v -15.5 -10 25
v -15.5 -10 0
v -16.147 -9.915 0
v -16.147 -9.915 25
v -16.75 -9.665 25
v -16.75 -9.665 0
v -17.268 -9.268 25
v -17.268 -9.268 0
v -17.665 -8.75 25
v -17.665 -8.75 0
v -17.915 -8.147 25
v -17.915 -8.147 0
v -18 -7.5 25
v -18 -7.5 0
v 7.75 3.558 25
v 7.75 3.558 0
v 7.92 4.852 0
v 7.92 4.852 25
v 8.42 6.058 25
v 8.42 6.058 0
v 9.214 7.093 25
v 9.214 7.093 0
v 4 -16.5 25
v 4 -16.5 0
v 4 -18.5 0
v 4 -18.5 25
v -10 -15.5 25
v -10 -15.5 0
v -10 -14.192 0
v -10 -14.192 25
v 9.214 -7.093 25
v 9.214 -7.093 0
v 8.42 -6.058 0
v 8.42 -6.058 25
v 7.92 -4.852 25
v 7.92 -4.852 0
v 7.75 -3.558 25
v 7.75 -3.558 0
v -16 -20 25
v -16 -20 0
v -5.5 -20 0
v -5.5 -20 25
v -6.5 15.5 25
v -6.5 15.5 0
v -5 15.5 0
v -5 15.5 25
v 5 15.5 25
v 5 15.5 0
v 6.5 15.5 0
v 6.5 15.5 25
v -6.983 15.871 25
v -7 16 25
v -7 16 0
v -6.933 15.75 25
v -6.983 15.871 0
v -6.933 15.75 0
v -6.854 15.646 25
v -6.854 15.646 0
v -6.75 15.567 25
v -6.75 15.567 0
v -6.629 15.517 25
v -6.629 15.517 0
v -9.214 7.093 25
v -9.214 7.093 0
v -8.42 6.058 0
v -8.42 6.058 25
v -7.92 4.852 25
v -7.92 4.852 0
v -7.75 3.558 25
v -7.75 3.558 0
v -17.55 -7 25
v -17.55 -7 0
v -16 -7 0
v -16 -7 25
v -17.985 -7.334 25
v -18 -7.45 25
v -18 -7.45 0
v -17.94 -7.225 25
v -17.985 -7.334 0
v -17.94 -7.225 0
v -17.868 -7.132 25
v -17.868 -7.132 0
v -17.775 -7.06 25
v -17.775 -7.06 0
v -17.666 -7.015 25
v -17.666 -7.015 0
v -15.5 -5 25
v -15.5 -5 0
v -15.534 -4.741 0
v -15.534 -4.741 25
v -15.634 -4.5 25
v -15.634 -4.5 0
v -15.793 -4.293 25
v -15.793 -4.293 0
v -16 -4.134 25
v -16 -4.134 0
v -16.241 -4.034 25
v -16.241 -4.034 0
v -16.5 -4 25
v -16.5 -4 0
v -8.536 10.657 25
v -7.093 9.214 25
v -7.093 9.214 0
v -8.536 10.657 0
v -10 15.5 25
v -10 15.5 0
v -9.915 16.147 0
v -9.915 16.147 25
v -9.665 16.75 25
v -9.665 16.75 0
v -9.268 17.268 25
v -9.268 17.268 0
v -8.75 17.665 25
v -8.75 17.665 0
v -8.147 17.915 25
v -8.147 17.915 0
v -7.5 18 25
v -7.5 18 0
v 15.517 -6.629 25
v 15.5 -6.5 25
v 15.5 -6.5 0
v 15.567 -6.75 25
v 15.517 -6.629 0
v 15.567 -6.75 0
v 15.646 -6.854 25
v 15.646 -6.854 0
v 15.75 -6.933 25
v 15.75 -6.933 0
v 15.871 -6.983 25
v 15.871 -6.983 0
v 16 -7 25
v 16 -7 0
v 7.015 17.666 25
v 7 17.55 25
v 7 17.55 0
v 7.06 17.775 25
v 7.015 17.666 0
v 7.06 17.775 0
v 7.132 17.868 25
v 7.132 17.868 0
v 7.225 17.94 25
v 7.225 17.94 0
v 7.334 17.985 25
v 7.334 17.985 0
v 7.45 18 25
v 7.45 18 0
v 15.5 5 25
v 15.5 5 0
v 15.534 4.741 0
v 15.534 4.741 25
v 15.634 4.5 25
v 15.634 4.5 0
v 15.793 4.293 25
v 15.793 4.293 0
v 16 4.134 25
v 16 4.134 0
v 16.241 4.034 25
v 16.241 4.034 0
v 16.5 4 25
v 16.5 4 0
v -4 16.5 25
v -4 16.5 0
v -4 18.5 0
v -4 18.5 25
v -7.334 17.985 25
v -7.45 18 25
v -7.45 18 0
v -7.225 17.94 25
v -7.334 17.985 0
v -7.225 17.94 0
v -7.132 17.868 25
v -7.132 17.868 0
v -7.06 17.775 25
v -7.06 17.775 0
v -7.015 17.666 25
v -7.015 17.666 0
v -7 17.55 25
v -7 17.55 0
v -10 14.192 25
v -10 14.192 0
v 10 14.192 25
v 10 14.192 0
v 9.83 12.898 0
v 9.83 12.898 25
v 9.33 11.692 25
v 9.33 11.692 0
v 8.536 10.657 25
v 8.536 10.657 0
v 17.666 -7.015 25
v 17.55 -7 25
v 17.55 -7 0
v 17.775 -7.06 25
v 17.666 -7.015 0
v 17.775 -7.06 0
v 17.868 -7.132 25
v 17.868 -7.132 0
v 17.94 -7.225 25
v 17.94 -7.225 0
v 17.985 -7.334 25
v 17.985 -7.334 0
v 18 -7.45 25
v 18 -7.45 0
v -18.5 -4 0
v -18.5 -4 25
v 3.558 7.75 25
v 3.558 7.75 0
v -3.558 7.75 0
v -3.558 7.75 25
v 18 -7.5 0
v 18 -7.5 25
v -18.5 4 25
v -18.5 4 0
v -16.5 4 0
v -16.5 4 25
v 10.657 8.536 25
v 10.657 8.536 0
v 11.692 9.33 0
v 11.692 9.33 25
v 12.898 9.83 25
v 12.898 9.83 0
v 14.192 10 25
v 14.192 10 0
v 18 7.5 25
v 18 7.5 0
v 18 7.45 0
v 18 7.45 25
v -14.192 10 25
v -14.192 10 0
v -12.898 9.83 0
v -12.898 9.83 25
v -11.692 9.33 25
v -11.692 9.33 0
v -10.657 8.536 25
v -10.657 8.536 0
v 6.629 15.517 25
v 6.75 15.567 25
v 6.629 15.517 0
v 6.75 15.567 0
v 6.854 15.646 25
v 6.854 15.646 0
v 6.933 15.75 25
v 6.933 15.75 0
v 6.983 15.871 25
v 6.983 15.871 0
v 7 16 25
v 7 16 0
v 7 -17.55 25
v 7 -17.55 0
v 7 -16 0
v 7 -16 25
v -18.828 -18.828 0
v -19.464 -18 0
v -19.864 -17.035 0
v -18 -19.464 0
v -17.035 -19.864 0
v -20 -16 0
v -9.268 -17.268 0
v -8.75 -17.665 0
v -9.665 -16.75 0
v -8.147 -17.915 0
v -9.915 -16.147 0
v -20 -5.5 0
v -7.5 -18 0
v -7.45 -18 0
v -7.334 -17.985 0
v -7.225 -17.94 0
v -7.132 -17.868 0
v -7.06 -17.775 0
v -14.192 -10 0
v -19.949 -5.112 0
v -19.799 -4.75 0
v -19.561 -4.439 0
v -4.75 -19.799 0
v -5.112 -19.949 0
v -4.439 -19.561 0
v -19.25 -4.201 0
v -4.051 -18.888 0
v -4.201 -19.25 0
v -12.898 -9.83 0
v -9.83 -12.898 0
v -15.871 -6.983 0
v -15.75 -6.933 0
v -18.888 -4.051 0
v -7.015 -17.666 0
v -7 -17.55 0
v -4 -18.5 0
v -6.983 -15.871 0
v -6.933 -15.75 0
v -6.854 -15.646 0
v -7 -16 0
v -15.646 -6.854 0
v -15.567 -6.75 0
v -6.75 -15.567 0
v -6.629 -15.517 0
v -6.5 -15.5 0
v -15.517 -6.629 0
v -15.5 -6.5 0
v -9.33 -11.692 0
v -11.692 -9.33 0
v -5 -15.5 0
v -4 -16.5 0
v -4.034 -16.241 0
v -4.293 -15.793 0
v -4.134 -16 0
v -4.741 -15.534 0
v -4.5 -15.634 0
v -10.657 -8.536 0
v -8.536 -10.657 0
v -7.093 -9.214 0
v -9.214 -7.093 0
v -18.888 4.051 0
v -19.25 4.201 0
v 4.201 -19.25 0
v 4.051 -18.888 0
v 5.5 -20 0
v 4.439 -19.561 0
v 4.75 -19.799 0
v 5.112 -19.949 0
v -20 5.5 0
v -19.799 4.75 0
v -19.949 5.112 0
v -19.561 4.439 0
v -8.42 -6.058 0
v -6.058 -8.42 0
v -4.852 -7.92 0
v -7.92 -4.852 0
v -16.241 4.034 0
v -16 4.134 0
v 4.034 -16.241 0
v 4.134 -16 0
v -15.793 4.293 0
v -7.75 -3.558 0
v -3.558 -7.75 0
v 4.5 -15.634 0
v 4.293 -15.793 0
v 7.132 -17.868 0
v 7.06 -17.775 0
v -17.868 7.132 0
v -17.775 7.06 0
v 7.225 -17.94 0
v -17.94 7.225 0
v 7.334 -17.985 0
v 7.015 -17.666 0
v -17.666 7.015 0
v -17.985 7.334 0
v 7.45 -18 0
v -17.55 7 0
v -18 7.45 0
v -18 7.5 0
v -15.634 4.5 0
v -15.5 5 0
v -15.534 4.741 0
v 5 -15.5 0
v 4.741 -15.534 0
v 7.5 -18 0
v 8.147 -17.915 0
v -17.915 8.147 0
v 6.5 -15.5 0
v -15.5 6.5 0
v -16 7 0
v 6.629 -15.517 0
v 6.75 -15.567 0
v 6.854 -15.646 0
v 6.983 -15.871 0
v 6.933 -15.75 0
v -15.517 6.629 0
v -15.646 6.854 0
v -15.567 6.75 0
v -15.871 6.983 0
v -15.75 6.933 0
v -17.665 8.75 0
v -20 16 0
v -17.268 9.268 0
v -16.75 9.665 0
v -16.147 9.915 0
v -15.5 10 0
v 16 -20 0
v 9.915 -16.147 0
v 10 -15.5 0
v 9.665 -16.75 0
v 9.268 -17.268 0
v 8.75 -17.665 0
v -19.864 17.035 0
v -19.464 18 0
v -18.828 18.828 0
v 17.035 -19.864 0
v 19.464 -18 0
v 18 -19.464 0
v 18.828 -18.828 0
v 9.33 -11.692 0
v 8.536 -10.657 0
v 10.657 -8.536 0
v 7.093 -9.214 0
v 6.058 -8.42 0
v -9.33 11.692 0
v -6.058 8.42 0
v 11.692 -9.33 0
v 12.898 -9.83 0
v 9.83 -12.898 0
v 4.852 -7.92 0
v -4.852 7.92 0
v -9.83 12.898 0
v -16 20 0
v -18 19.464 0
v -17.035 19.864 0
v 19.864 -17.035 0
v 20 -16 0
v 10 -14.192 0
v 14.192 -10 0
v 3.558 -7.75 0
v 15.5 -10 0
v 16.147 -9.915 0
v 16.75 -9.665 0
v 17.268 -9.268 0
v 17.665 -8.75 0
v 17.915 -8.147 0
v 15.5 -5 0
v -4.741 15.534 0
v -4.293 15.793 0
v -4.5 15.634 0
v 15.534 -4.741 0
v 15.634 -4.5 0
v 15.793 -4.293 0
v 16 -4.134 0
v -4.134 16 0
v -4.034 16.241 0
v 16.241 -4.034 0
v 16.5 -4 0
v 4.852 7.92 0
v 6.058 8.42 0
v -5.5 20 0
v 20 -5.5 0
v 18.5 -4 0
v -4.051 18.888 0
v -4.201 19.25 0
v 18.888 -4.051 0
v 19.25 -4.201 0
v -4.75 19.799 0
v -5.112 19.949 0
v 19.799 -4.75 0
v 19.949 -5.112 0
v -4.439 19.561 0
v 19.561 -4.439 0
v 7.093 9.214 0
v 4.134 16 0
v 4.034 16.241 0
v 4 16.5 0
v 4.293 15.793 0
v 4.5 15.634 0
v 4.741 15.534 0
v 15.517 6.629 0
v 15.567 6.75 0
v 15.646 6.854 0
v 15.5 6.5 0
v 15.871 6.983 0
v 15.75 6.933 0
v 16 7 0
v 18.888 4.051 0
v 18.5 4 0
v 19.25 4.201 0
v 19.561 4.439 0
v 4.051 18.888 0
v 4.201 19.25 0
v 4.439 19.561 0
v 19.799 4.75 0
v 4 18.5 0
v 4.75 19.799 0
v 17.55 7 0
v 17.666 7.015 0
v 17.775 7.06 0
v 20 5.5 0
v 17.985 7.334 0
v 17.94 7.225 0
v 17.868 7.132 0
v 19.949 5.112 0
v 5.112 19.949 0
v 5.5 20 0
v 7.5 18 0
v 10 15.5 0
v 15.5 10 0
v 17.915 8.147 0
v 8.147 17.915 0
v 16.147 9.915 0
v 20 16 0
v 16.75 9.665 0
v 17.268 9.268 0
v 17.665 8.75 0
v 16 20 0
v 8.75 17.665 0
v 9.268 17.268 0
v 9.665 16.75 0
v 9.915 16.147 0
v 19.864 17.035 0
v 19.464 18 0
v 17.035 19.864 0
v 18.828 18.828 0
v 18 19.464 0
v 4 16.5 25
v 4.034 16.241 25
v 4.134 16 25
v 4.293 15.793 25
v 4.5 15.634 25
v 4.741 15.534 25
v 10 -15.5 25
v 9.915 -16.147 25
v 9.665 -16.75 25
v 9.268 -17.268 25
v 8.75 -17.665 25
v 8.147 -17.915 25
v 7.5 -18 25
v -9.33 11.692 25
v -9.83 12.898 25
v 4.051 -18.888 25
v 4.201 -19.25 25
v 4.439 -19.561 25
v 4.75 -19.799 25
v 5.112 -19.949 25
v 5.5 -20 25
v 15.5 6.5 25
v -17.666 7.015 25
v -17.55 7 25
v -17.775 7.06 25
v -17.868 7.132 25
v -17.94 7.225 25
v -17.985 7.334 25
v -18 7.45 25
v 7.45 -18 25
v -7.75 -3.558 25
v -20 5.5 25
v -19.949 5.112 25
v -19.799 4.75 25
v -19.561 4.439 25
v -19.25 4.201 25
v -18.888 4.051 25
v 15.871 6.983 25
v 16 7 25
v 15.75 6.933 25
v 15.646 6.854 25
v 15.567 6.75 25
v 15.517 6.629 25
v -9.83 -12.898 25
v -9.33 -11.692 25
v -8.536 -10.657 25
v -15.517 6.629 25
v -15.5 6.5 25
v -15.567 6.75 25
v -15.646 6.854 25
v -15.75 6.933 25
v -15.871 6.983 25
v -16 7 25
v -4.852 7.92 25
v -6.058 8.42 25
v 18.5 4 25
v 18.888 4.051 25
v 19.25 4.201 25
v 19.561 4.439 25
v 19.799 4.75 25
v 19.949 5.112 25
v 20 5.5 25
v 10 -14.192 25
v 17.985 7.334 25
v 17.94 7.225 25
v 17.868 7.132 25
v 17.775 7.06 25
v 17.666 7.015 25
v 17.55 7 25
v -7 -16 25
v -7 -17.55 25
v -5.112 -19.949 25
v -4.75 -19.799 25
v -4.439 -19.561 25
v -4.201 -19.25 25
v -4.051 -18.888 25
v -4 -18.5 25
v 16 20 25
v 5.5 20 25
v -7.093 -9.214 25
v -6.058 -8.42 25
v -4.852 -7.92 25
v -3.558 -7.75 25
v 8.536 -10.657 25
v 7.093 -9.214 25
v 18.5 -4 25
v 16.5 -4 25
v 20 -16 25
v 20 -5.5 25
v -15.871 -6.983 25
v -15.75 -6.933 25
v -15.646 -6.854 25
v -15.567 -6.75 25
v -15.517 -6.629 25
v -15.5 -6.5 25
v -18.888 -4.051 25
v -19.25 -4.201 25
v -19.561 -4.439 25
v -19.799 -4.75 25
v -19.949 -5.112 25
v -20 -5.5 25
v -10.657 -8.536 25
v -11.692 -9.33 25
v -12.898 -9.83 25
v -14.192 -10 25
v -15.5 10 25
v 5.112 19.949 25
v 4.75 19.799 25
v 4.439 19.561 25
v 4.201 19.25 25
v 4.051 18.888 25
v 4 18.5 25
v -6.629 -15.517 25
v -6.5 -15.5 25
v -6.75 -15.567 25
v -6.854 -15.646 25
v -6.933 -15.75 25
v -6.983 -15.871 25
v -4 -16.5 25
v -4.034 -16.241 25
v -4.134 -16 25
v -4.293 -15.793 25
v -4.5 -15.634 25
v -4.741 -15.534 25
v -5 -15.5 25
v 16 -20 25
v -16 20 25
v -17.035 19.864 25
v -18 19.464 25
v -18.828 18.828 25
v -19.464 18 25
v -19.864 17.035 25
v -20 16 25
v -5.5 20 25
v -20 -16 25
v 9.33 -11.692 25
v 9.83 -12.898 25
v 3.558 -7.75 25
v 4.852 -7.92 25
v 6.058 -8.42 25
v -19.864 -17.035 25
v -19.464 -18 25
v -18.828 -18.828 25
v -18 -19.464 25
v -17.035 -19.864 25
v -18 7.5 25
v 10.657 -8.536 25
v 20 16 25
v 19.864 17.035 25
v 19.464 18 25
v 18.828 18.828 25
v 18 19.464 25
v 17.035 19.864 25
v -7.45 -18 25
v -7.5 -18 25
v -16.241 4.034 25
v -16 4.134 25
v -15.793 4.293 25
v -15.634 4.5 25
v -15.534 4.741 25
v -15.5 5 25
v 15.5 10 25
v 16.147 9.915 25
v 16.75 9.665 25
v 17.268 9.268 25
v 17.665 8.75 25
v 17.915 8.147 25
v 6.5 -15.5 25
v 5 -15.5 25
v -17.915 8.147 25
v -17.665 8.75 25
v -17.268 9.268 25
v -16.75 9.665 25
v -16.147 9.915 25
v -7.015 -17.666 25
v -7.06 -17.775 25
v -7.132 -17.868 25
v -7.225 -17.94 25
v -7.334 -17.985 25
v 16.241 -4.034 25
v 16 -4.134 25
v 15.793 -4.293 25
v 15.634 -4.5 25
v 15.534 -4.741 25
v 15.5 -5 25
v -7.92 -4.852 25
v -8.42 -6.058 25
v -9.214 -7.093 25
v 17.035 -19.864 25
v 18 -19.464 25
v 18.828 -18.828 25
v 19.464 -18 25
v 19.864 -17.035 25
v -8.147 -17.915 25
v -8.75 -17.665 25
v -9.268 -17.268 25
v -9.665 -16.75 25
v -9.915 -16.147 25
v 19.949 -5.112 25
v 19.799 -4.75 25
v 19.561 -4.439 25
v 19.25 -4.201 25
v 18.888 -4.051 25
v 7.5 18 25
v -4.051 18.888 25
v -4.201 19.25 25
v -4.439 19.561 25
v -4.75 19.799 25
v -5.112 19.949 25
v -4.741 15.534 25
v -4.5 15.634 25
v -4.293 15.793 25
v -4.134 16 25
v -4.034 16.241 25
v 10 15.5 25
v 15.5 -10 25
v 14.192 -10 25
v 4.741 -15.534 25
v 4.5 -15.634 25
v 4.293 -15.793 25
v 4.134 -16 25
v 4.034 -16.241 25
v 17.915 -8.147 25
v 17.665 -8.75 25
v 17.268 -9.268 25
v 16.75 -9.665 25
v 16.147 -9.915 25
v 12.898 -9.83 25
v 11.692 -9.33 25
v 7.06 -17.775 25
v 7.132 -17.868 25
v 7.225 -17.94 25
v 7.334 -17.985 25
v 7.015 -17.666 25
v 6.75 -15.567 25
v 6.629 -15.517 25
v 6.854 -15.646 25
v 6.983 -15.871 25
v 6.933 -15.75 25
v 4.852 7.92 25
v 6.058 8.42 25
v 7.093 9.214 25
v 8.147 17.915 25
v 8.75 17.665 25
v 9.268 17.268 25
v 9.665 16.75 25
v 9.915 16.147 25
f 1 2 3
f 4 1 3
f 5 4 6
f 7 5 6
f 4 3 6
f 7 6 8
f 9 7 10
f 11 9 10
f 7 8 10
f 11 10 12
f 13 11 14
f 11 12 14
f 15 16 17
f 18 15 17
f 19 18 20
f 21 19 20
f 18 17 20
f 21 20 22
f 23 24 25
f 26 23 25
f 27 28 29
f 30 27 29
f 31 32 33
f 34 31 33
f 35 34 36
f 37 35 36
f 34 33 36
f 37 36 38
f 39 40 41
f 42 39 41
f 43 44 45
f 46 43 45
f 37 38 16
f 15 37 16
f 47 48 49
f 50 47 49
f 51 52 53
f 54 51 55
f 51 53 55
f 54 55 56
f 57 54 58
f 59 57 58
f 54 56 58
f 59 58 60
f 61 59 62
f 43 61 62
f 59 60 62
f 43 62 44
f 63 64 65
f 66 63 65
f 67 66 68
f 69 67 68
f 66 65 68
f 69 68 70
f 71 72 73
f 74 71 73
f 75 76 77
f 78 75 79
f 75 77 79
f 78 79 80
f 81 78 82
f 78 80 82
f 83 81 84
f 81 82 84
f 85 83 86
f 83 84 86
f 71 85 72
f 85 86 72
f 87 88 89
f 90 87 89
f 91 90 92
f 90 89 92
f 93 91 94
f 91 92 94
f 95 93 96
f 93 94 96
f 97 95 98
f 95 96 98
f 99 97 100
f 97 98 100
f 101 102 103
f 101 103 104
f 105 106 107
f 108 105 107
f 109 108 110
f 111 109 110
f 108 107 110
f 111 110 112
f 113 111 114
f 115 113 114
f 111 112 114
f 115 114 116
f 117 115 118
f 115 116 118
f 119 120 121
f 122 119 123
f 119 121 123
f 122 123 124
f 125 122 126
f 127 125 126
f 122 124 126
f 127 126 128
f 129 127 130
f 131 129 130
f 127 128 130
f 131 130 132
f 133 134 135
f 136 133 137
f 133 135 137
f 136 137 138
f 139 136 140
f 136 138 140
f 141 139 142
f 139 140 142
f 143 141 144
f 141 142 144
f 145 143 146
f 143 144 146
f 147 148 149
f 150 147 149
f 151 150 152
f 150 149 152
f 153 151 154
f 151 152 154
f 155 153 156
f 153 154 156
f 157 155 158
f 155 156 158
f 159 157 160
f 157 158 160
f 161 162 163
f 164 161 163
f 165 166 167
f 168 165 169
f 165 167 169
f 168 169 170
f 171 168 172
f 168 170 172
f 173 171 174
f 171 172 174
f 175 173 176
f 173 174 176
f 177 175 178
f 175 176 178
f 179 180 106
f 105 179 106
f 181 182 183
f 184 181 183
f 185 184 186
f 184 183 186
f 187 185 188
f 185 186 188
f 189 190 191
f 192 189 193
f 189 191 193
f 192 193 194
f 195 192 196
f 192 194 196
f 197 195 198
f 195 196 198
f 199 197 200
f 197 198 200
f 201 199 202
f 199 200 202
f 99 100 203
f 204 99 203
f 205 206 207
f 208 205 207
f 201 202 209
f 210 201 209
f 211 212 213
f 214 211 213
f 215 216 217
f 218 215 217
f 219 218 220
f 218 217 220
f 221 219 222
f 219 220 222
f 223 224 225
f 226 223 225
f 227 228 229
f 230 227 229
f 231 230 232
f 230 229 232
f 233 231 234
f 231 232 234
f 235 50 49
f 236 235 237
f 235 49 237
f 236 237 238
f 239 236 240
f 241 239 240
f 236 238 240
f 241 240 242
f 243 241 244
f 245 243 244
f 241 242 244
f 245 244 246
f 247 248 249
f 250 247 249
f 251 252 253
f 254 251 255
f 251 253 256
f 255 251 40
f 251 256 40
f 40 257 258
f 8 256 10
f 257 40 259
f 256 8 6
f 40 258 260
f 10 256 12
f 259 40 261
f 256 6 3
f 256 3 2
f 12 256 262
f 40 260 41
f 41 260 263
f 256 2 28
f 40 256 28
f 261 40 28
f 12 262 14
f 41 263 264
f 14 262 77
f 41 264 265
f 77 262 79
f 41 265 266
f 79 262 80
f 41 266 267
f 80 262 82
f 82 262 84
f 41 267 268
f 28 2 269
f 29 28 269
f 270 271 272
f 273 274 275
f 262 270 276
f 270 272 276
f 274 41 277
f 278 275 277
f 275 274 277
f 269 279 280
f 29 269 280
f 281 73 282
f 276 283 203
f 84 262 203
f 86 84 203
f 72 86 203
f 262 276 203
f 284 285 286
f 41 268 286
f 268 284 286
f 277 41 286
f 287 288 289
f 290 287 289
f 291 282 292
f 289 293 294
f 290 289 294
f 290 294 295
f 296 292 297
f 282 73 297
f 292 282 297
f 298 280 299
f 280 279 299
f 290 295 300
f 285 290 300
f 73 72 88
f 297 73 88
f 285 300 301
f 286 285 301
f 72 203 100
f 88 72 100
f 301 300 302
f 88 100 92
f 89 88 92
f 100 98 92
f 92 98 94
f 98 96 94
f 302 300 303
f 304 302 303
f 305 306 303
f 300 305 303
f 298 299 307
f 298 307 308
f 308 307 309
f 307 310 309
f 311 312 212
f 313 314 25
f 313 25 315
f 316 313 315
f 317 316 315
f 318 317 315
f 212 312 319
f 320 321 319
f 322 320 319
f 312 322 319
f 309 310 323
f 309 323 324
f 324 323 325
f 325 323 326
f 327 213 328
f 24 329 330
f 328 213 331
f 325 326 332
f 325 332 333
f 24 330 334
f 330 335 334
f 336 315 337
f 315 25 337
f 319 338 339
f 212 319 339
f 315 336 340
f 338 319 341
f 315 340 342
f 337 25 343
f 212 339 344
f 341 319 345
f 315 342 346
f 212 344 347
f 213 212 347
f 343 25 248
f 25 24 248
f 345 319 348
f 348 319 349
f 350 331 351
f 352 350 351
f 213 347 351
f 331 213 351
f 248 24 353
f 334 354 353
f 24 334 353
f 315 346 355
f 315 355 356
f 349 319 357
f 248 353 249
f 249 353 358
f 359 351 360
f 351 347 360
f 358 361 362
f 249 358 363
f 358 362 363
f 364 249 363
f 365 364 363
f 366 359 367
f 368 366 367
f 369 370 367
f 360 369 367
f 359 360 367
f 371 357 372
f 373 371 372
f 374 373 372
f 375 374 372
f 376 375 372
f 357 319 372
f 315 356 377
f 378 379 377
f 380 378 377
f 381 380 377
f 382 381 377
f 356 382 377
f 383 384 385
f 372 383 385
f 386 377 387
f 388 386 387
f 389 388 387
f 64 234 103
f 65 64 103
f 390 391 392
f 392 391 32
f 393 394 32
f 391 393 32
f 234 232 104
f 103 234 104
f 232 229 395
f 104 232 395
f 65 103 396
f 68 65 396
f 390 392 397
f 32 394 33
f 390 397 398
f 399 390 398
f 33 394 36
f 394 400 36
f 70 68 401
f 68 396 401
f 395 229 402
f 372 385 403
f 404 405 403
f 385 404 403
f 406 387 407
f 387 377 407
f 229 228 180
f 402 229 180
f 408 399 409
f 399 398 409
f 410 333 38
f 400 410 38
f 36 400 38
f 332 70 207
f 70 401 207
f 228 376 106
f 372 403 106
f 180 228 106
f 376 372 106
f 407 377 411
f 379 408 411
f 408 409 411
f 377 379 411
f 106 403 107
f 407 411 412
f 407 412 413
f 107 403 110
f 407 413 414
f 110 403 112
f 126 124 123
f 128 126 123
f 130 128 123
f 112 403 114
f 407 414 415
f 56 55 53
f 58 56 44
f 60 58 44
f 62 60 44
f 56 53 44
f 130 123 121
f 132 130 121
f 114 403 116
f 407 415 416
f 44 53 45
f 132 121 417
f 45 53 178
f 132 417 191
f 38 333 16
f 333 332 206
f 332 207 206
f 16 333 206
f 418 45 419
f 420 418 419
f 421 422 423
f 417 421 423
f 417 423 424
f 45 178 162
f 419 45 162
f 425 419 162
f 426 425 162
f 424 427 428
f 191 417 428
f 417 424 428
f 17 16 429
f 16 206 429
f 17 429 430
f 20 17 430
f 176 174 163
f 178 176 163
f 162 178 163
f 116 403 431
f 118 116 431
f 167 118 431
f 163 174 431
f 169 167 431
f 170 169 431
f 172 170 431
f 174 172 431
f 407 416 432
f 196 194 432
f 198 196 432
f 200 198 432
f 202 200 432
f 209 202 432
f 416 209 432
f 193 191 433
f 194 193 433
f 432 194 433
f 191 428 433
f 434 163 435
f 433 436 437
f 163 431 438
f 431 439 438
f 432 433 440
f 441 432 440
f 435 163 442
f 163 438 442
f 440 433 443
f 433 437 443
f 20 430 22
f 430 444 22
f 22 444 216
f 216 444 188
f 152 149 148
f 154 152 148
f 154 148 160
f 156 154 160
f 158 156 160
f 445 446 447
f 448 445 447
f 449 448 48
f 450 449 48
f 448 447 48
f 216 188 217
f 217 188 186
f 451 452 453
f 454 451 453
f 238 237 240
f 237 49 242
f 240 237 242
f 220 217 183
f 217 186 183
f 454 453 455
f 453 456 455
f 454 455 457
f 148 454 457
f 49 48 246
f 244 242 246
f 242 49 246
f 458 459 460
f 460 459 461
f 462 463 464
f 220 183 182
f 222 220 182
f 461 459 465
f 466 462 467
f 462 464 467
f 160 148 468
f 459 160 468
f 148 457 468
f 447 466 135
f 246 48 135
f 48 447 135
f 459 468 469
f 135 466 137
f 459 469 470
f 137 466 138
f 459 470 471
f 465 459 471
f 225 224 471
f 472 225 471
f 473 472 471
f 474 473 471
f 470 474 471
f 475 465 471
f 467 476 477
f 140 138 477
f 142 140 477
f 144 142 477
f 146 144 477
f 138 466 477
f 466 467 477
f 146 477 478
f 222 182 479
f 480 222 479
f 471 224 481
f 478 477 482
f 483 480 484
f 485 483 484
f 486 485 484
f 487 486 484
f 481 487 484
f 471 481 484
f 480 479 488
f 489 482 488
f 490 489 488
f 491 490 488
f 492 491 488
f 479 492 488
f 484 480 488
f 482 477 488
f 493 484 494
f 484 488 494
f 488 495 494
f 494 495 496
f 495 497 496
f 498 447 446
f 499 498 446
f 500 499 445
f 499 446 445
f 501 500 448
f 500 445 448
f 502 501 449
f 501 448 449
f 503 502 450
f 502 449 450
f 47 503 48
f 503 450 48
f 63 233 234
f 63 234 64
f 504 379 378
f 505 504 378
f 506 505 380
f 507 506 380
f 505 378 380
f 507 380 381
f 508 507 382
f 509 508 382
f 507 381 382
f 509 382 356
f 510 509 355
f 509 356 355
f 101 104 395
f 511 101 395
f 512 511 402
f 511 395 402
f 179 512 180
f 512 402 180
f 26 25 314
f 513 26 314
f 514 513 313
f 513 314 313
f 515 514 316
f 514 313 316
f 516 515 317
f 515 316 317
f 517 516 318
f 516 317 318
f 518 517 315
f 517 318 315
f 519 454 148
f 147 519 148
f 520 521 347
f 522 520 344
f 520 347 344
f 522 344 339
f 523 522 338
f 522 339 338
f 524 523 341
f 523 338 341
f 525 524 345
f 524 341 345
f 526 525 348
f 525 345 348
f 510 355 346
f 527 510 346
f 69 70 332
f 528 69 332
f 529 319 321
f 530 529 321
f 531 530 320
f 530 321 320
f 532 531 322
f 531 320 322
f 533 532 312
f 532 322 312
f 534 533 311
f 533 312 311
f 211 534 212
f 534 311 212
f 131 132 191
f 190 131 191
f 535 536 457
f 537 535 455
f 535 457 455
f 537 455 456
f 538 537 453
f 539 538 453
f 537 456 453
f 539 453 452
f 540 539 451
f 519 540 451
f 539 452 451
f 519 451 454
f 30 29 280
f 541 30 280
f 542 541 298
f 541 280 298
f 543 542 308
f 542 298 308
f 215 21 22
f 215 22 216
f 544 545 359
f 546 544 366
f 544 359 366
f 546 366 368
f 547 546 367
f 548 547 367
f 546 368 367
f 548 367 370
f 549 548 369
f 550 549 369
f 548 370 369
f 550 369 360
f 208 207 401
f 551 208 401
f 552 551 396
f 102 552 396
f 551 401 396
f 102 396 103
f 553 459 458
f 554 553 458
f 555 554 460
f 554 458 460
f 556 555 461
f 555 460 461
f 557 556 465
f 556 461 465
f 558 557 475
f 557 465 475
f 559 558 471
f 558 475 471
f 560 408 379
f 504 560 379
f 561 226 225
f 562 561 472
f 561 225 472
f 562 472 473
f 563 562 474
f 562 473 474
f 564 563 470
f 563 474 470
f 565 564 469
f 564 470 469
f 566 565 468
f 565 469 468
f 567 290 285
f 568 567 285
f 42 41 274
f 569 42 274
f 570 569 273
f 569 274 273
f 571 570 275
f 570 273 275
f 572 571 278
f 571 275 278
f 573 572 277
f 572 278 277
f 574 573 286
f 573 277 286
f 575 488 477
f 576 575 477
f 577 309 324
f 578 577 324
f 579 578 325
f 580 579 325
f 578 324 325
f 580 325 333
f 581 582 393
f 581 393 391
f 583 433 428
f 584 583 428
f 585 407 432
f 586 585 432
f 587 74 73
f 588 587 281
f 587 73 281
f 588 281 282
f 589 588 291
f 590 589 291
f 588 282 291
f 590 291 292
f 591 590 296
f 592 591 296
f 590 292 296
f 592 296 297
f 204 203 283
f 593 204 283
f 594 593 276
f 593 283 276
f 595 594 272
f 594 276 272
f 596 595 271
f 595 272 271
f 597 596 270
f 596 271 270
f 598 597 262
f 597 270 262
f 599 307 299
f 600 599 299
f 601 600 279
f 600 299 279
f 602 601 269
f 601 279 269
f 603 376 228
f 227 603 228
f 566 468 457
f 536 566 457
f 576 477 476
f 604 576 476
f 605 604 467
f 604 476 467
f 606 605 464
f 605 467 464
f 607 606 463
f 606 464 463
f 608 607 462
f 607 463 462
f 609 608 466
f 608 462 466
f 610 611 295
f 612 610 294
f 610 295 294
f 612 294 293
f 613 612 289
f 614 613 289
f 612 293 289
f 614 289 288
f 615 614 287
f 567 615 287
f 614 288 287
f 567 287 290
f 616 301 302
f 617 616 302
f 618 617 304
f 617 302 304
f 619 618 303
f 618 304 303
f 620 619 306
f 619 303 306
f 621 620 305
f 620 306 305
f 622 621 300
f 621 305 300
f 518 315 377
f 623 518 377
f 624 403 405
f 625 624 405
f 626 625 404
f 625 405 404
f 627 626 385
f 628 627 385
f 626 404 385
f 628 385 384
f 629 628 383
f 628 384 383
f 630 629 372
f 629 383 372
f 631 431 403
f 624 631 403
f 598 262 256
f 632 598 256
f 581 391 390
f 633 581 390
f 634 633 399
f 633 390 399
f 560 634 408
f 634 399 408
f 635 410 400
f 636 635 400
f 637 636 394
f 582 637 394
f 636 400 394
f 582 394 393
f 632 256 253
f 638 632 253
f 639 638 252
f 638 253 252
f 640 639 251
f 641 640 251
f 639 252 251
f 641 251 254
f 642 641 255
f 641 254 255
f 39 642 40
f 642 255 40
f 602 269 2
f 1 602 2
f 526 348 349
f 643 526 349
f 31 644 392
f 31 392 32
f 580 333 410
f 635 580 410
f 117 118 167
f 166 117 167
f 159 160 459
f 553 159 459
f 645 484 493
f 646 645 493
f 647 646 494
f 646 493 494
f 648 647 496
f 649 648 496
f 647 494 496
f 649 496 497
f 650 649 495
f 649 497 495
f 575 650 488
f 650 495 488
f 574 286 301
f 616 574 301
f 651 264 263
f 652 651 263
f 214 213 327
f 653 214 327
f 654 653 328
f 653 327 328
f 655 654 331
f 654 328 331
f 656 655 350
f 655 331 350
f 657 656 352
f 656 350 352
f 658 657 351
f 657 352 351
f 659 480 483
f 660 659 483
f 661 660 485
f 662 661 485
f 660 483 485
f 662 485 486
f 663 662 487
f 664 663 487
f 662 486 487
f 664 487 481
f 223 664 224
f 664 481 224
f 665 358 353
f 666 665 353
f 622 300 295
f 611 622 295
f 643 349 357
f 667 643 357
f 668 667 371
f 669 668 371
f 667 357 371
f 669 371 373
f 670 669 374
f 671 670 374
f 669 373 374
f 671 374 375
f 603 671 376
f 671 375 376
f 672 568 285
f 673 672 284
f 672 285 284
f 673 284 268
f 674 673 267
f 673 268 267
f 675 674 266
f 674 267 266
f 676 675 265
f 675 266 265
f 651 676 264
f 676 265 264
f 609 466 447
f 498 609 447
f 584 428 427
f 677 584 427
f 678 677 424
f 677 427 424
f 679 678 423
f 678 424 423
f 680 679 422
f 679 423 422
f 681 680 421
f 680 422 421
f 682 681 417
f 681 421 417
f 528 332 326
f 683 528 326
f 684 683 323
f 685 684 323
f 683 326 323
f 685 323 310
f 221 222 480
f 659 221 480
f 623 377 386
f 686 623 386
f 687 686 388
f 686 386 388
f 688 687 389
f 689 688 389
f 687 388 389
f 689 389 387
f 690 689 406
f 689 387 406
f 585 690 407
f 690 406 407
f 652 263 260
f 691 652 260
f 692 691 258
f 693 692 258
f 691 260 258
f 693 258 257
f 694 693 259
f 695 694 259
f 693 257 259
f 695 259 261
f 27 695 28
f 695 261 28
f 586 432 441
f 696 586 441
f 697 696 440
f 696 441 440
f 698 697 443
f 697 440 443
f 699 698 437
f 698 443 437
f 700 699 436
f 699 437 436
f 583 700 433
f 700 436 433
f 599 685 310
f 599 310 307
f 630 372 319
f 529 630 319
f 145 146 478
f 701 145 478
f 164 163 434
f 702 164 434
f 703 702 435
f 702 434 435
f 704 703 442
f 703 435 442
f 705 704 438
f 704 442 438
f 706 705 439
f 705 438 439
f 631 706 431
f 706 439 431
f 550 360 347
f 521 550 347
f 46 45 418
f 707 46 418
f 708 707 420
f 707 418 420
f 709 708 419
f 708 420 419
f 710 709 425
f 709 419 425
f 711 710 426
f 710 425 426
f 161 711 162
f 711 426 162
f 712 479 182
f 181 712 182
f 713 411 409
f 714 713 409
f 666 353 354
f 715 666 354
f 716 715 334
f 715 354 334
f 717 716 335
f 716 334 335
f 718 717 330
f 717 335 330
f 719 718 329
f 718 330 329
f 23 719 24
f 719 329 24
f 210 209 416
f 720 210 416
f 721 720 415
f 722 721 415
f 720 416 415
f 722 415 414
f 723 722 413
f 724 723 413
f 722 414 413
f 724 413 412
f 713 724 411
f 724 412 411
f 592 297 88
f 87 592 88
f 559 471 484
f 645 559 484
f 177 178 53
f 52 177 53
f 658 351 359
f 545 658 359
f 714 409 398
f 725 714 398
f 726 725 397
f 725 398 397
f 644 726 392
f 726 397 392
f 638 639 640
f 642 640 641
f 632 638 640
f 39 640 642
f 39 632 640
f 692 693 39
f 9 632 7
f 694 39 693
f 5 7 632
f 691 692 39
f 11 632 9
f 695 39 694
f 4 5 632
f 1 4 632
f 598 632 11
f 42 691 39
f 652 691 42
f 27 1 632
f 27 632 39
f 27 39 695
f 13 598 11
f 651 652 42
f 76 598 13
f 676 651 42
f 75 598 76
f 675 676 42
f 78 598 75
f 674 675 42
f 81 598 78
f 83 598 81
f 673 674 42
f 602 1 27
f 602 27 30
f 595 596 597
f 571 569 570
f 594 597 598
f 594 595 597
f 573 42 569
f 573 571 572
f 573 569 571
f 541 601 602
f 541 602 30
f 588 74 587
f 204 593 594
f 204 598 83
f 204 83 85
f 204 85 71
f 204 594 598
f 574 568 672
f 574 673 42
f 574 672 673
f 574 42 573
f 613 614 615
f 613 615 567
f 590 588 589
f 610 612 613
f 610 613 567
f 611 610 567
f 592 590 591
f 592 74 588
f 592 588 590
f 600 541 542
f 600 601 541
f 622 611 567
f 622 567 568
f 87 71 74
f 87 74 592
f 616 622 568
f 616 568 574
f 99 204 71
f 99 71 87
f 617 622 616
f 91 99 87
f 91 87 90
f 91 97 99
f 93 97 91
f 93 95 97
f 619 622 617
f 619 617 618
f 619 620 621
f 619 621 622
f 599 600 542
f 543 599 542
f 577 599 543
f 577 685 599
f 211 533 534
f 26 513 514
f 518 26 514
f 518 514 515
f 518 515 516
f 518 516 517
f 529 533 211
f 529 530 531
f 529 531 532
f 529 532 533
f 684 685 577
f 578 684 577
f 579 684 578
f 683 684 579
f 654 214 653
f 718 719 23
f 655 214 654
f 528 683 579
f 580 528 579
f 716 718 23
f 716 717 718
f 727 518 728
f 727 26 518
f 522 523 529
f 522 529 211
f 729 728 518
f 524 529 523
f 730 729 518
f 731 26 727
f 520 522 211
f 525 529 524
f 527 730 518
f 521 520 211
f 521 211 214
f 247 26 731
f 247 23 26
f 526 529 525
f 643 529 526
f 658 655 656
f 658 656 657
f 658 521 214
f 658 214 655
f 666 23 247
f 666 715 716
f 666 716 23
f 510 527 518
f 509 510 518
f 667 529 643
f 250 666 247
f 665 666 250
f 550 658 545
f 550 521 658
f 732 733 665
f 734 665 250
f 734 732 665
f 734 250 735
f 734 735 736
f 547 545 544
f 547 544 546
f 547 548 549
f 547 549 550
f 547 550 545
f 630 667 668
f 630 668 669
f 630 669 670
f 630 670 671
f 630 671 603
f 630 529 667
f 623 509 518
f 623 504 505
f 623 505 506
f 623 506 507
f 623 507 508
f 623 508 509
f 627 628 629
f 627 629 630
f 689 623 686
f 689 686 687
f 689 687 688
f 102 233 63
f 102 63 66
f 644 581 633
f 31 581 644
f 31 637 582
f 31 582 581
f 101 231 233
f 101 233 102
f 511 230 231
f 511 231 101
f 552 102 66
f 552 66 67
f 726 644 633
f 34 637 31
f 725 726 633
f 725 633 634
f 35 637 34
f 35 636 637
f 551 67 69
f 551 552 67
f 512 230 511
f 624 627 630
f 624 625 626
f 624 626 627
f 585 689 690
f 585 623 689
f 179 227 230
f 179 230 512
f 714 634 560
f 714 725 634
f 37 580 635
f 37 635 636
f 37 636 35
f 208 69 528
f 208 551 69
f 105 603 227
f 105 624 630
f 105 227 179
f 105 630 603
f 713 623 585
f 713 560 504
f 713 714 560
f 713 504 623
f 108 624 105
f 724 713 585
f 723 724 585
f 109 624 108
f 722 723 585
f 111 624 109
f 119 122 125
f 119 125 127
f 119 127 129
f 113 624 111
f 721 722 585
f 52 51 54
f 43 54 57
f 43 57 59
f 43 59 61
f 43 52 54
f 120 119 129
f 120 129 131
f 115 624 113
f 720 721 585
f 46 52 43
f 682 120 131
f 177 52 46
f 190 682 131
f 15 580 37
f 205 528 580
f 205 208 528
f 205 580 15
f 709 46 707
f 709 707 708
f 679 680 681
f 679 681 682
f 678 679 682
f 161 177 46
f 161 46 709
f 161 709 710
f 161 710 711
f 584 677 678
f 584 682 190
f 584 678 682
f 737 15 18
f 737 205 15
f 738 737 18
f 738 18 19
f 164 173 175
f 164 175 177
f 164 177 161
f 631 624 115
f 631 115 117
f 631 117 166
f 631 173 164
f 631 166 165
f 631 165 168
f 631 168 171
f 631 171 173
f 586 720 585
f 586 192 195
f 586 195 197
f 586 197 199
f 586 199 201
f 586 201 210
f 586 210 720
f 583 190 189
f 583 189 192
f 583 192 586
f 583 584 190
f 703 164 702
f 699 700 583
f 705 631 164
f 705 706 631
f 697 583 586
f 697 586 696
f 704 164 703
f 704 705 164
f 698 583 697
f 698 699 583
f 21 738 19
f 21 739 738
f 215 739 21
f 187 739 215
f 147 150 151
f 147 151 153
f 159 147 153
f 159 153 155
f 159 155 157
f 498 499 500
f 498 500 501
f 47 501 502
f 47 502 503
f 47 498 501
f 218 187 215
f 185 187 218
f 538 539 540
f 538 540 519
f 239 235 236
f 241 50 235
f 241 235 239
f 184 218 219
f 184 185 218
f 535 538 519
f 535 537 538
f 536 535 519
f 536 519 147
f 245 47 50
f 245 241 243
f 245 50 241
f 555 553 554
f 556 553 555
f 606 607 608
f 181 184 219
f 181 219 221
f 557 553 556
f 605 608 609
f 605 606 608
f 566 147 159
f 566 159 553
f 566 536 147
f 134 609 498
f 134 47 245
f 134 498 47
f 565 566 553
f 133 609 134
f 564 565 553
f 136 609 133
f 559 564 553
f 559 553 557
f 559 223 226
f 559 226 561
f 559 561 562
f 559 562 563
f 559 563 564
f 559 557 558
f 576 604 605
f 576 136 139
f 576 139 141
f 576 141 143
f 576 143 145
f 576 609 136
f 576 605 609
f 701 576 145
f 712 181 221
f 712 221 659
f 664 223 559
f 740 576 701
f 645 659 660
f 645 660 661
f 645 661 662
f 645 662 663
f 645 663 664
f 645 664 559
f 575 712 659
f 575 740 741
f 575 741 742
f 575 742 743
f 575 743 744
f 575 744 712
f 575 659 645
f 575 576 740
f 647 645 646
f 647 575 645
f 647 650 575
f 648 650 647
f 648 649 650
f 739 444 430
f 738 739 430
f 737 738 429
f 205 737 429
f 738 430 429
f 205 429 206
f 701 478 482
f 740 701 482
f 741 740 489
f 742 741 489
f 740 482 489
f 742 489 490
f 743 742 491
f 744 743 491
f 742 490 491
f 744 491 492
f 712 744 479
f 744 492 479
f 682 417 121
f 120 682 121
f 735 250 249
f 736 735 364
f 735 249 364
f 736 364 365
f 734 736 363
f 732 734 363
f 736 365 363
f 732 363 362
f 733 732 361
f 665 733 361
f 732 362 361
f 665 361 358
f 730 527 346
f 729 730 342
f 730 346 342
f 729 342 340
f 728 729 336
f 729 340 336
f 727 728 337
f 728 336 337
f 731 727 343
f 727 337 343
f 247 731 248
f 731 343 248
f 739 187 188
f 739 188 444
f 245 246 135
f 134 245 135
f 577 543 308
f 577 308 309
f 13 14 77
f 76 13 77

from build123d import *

# Parameters (mm, degrees)
F1_DEPTH = 25


with BuildPart() as f1:
    # F0 (on Top) → F1 (new body)
    with BuildSketch(Plane.XY):
        with BuildLine():
            Line((-16.5, -4), (-18.5, -4))
            ThreePointArc((-18.5, -4), (-19.56066, -4.43934), (-20, -5.5))
            Line((-20, -5.5), (-20, -16))
            ThreePointArc((-20, -16), (-18.828427, -18.828427), (-16, -20))
            Line((-16, -20), (-5.5, -20))
            ThreePointArc((-5.5, -20), (-4.43934, -19.56066), (-4, -18.5))
            Line((-4, -18.5), (-4, -16.5))
            ThreePointArc((-4, -16.5), (-4.292893, -15.792893), (-5, -15.5))
            Line((-5, -15.5), (-6.5, -15.5))
            ThreePointArc((-6.5, -15.5), (-6.853553, -15.646447), (-7, -16))
            Line((-7, -16), (-7, -17.55))
            ThreePointArc((-7, -17.55), (-7.131802, -17.868198), (-7.45, -18))
            Line((-7.45, -18), (-7.5, -18))
            ThreePointArc((-7.5, -18), (-9.267767, -17.267767), (-10, -15.5))
            Line((-10, -15.5), (-10, -14.192388))
            ThreePointArc((-10, -14.192388), (-9.619398, -12.278971), (-8.535534, -10.656854))
            Line((-8.535534, -10.656854), (-7.093146, -9.214466))
            ThreePointArc((-7.093146, -9.214466), (-5.471029, -8.130602), (-3.557612, -7.75))
            Line((-3.557612, -7.75), (3.557612, -7.75))
            ThreePointArc((3.557612, -7.75), (5.471029, -8.130602), (7.093146, -9.214466))
            Line((7.093146, -9.214466), (8.535534, -10.656854))
            ThreePointArc((8.535534, -10.656854), (9.619398, -12.278971), (10, -14.192388))
            Line((10, -14.192388), (10, -15.5))
            ThreePointArc((10, -15.5), (9.267767, -17.267767), (7.5, -18))
            Line((7.5, -18), (7.45, -18))
            ThreePointArc((7.45, -18), (7.131802, -17.868198), (7, -17.55))
            Line((7, -17.55), (7, -16))
            ThreePointArc((7, -16), (6.853553, -15.646447), (6.5, -15.5))
            Line((6.5, -15.5), (5, -15.5))
            ThreePointArc((5, -15.5), (4.292893, -15.792893), (4, -16.5))
            Line((4, -16.5), (4, -18.5))
            ThreePointArc((4, -18.5), (4.43934, -19.56066), (5.5, -20))
            Line((5.5, -20), (16, -20))
            ThreePointArc((16, -20), (18.828427, -18.828427), (20, -16))
            Line((20, -16), (20, -5.5))
            ThreePointArc((20, -5.5), (19.56066, -4.43934), (18.5, -4))
            Line((18.5, -4), (16.5, -4))
            ThreePointArc((16.5, -4), (15.792893, -4.292893), (15.5, -5))
            Line((15.5, -5), (15.5, -6.5))
            ThreePointArc((15.5, -6.5), (15.646447, -6.853553), (16, -7))
            Line((16, -7), (17.55, -7))
            ThreePointArc((17.55, -7), (17.868198, -7.131802), (18, -7.45))
            Line((18, -7.45), (18, -7.5))
            ThreePointArc((18, -7.5), (17.267767, -9.267767), (15.5, -10))
            Line((15.5, -10), (14.192388, -10))
            ThreePointArc((14.192388, -10), (12.278971, -9.619398), (10.656854, -8.535534))
            Line((10.656854, -8.535534), (9.214466, -7.093146))
            ThreePointArc((9.214466, -7.093146), (8.130602, -5.471029), (7.75, -3.557612))
            Line((7.75, -3.557612), (7.75, 3.557612))
            ThreePointArc((7.75, 3.557612), (8.130602, 5.471029), (9.214466, 7.093146))
            Line((9.214466, 7.093146), (10.656854, 8.535534))
            ThreePointArc((10.656854, 8.535534), (12.278971, 9.619398), (14.192388, 10))
            Line((14.192388, 10), (15.5, 10))
            ThreePointArc((15.5, 10), (17.267767, 9.267767), (18, 7.5))
            Line((18, 7.5), (18, 7.45))
            ThreePointArc((18, 7.45), (17.868198, 7.131802), (17.55, 7))
            Line((17.55, 7), (16, 7))
            ThreePointArc((16, 7), (15.646447, 6.853553), (15.5, 6.5))
            Line((15.5, 6.5), (15.5, 5))
            ThreePointArc((15.5, 5), (15.792893, 4.292893), (16.5, 4))
            Line((16.5, 4), (18.5, 4))
            ThreePointArc((18.5, 4), (19.56066, 4.43934), (20, 5.5))
            Line((20, 5.5), (20, 16))
            ThreePointArc((20, 16), (18.828427, 18.828427), (16, 20))
            Line((16, 20), (5.5, 20))
            ThreePointArc((5.5, 20), (4.43934, 19.56066), (4, 18.5))
            Line((4, 18.5), (4, 16.5))
            ThreePointArc((4, 16.5), (4.292893, 15.792893), (5, 15.5))
            Line((5, 15.5), (6.5, 15.5))
            ThreePointArc((6.5, 15.5), (6.853553, 15.646447), (7, 16))
            Line((7, 16), (7, 17.55))
            ThreePointArc((7, 17.55), (7.131802, 17.868198), (7.45, 18))
            Line((7.45, 18), (7.5, 18))
            ThreePointArc((7.5, 18), (9.267767, 17.267767), (10, 15.5))
            Line((10, 15.5), (10, 14.192388))
            ThreePointArc((10, 14.192388), (9.619398, 12.278971), (8.535534, 10.656854))
            Line((8.535534, 10.656854), (7.093146, 9.214466))
            ThreePointArc((7.093146, 9.214466), (5.471029, 8.130602), (3.557612, 7.75))
            Line((3.557612, 7.75), (-3.557612, 7.75))
            ThreePointArc((-3.557612, 7.75), (-5.471029, 8.130602), (-7.093146, 9.214466))
            Line((-7.093146, 9.214466), (-8.535534, 10.656854))
            ThreePointArc((-8.535534, 10.656854), (-9.619398, 12.278971), (-10, 14.192388))
            Line((-10, 14.192388), (-10, 15.5))
            ThreePointArc((-10, 15.5), (-9.267767, 17.267767), (-7.5, 18))
            Line((-7.5, 18), (-7.45, 18))
            ThreePointArc((-7.45, 18), (-7.131802, 17.868198), (-7, 17.55))
            Line((-7, 17.55), (-7, 16))
            ThreePointArc((-7, 16), (-6.853553, 15.646447), (-6.5, 15.5))
            Line((-6.5, 15.5), (-5, 15.5))
            ThreePointArc((-5, 15.5), (-4.292893, 15.792893), (-4, 16.5))
            Line((-4, 16.5), (-4, 18.5))
            ThreePointArc((-4, 18.5), (-4.43934, 19.56066), (-5.5, 20))
            Line((-5.5, 20), (-16, 20))
            ThreePointArc((-16, 20), (-18.828427, 18.828427), (-20, 16))
            Line((-20, 16), (-20, 5.5))
            ThreePointArc((-20, 5.5), (-19.56066, 4.43934), (-18.5, 4))
            Line((-18.5, 4), (-16.5, 4))
            ThreePointArc((-16.5, 4), (-15.792893, 4.292893), (-15.5, 5))
            Line((-15.5, 5), (-15.5, 6.5))
            ThreePointArc((-15.5, 6.5), (-15.646447, 6.853553), (-16, 7))
            Line((-16, 7), (-17.55, 7))
            ThreePointArc((-17.55, 7), (-17.868198, 7.131802), (-18, 7.45))
            Line((-18, 7.45), (-18, 7.5))
            ThreePointArc((-18, 7.5), (-17.267767, 9.267767), (-15.5, 10))
            Line((-15.5, 10), (-14.192388, 10))
            ThreePointArc((-14.192388, 10), (-12.278971, 9.619398), (-10.656854, 8.535534))
            Line((-10.656854, 8.535534), (-9.214466, 7.093146))
            ThreePointArc((-9.214466, 7.093146), (-8.130602, 5.471029), (-7.75, 3.557612))
            Line((-7.75, 3.557612), (-7.75, -3.557612))
            ThreePointArc((-7.75, -3.557612), (-8.130602, -5.471029), (-9.214466, -7.093146))
            Line((-9.214466, -7.093146), (-10.656854, -8.535534))
            ThreePointArc((-10.656854, -8.535534), (-12.278971, -9.619398), (-14.192388, -10))
            Line((-14.192388, -10), (-15.5, -10))
            ThreePointArc((-15.5, -10), (-17.267767, -9.267767), (-18, -7.5))
            Line((-18, -7.5), (-18, -7.45))
            ThreePointArc((-18, -7.45), (-17.868198, -7.131802), (-17.55, -7))
            Line((-17.55, -7), (-16, -7))
            ThreePointArc((-16, -7), (-15.646447, -6.853553), (-15.5, -6.5))
            Line((-15.5, -6.5), (-15.5, -5))
            ThreePointArc((-15.5, -5), (-15.792893, -4.292893), (-16.5, -4))
        make_face()
    extrude(amount=F1_DEPTH)


solid = f1.part
